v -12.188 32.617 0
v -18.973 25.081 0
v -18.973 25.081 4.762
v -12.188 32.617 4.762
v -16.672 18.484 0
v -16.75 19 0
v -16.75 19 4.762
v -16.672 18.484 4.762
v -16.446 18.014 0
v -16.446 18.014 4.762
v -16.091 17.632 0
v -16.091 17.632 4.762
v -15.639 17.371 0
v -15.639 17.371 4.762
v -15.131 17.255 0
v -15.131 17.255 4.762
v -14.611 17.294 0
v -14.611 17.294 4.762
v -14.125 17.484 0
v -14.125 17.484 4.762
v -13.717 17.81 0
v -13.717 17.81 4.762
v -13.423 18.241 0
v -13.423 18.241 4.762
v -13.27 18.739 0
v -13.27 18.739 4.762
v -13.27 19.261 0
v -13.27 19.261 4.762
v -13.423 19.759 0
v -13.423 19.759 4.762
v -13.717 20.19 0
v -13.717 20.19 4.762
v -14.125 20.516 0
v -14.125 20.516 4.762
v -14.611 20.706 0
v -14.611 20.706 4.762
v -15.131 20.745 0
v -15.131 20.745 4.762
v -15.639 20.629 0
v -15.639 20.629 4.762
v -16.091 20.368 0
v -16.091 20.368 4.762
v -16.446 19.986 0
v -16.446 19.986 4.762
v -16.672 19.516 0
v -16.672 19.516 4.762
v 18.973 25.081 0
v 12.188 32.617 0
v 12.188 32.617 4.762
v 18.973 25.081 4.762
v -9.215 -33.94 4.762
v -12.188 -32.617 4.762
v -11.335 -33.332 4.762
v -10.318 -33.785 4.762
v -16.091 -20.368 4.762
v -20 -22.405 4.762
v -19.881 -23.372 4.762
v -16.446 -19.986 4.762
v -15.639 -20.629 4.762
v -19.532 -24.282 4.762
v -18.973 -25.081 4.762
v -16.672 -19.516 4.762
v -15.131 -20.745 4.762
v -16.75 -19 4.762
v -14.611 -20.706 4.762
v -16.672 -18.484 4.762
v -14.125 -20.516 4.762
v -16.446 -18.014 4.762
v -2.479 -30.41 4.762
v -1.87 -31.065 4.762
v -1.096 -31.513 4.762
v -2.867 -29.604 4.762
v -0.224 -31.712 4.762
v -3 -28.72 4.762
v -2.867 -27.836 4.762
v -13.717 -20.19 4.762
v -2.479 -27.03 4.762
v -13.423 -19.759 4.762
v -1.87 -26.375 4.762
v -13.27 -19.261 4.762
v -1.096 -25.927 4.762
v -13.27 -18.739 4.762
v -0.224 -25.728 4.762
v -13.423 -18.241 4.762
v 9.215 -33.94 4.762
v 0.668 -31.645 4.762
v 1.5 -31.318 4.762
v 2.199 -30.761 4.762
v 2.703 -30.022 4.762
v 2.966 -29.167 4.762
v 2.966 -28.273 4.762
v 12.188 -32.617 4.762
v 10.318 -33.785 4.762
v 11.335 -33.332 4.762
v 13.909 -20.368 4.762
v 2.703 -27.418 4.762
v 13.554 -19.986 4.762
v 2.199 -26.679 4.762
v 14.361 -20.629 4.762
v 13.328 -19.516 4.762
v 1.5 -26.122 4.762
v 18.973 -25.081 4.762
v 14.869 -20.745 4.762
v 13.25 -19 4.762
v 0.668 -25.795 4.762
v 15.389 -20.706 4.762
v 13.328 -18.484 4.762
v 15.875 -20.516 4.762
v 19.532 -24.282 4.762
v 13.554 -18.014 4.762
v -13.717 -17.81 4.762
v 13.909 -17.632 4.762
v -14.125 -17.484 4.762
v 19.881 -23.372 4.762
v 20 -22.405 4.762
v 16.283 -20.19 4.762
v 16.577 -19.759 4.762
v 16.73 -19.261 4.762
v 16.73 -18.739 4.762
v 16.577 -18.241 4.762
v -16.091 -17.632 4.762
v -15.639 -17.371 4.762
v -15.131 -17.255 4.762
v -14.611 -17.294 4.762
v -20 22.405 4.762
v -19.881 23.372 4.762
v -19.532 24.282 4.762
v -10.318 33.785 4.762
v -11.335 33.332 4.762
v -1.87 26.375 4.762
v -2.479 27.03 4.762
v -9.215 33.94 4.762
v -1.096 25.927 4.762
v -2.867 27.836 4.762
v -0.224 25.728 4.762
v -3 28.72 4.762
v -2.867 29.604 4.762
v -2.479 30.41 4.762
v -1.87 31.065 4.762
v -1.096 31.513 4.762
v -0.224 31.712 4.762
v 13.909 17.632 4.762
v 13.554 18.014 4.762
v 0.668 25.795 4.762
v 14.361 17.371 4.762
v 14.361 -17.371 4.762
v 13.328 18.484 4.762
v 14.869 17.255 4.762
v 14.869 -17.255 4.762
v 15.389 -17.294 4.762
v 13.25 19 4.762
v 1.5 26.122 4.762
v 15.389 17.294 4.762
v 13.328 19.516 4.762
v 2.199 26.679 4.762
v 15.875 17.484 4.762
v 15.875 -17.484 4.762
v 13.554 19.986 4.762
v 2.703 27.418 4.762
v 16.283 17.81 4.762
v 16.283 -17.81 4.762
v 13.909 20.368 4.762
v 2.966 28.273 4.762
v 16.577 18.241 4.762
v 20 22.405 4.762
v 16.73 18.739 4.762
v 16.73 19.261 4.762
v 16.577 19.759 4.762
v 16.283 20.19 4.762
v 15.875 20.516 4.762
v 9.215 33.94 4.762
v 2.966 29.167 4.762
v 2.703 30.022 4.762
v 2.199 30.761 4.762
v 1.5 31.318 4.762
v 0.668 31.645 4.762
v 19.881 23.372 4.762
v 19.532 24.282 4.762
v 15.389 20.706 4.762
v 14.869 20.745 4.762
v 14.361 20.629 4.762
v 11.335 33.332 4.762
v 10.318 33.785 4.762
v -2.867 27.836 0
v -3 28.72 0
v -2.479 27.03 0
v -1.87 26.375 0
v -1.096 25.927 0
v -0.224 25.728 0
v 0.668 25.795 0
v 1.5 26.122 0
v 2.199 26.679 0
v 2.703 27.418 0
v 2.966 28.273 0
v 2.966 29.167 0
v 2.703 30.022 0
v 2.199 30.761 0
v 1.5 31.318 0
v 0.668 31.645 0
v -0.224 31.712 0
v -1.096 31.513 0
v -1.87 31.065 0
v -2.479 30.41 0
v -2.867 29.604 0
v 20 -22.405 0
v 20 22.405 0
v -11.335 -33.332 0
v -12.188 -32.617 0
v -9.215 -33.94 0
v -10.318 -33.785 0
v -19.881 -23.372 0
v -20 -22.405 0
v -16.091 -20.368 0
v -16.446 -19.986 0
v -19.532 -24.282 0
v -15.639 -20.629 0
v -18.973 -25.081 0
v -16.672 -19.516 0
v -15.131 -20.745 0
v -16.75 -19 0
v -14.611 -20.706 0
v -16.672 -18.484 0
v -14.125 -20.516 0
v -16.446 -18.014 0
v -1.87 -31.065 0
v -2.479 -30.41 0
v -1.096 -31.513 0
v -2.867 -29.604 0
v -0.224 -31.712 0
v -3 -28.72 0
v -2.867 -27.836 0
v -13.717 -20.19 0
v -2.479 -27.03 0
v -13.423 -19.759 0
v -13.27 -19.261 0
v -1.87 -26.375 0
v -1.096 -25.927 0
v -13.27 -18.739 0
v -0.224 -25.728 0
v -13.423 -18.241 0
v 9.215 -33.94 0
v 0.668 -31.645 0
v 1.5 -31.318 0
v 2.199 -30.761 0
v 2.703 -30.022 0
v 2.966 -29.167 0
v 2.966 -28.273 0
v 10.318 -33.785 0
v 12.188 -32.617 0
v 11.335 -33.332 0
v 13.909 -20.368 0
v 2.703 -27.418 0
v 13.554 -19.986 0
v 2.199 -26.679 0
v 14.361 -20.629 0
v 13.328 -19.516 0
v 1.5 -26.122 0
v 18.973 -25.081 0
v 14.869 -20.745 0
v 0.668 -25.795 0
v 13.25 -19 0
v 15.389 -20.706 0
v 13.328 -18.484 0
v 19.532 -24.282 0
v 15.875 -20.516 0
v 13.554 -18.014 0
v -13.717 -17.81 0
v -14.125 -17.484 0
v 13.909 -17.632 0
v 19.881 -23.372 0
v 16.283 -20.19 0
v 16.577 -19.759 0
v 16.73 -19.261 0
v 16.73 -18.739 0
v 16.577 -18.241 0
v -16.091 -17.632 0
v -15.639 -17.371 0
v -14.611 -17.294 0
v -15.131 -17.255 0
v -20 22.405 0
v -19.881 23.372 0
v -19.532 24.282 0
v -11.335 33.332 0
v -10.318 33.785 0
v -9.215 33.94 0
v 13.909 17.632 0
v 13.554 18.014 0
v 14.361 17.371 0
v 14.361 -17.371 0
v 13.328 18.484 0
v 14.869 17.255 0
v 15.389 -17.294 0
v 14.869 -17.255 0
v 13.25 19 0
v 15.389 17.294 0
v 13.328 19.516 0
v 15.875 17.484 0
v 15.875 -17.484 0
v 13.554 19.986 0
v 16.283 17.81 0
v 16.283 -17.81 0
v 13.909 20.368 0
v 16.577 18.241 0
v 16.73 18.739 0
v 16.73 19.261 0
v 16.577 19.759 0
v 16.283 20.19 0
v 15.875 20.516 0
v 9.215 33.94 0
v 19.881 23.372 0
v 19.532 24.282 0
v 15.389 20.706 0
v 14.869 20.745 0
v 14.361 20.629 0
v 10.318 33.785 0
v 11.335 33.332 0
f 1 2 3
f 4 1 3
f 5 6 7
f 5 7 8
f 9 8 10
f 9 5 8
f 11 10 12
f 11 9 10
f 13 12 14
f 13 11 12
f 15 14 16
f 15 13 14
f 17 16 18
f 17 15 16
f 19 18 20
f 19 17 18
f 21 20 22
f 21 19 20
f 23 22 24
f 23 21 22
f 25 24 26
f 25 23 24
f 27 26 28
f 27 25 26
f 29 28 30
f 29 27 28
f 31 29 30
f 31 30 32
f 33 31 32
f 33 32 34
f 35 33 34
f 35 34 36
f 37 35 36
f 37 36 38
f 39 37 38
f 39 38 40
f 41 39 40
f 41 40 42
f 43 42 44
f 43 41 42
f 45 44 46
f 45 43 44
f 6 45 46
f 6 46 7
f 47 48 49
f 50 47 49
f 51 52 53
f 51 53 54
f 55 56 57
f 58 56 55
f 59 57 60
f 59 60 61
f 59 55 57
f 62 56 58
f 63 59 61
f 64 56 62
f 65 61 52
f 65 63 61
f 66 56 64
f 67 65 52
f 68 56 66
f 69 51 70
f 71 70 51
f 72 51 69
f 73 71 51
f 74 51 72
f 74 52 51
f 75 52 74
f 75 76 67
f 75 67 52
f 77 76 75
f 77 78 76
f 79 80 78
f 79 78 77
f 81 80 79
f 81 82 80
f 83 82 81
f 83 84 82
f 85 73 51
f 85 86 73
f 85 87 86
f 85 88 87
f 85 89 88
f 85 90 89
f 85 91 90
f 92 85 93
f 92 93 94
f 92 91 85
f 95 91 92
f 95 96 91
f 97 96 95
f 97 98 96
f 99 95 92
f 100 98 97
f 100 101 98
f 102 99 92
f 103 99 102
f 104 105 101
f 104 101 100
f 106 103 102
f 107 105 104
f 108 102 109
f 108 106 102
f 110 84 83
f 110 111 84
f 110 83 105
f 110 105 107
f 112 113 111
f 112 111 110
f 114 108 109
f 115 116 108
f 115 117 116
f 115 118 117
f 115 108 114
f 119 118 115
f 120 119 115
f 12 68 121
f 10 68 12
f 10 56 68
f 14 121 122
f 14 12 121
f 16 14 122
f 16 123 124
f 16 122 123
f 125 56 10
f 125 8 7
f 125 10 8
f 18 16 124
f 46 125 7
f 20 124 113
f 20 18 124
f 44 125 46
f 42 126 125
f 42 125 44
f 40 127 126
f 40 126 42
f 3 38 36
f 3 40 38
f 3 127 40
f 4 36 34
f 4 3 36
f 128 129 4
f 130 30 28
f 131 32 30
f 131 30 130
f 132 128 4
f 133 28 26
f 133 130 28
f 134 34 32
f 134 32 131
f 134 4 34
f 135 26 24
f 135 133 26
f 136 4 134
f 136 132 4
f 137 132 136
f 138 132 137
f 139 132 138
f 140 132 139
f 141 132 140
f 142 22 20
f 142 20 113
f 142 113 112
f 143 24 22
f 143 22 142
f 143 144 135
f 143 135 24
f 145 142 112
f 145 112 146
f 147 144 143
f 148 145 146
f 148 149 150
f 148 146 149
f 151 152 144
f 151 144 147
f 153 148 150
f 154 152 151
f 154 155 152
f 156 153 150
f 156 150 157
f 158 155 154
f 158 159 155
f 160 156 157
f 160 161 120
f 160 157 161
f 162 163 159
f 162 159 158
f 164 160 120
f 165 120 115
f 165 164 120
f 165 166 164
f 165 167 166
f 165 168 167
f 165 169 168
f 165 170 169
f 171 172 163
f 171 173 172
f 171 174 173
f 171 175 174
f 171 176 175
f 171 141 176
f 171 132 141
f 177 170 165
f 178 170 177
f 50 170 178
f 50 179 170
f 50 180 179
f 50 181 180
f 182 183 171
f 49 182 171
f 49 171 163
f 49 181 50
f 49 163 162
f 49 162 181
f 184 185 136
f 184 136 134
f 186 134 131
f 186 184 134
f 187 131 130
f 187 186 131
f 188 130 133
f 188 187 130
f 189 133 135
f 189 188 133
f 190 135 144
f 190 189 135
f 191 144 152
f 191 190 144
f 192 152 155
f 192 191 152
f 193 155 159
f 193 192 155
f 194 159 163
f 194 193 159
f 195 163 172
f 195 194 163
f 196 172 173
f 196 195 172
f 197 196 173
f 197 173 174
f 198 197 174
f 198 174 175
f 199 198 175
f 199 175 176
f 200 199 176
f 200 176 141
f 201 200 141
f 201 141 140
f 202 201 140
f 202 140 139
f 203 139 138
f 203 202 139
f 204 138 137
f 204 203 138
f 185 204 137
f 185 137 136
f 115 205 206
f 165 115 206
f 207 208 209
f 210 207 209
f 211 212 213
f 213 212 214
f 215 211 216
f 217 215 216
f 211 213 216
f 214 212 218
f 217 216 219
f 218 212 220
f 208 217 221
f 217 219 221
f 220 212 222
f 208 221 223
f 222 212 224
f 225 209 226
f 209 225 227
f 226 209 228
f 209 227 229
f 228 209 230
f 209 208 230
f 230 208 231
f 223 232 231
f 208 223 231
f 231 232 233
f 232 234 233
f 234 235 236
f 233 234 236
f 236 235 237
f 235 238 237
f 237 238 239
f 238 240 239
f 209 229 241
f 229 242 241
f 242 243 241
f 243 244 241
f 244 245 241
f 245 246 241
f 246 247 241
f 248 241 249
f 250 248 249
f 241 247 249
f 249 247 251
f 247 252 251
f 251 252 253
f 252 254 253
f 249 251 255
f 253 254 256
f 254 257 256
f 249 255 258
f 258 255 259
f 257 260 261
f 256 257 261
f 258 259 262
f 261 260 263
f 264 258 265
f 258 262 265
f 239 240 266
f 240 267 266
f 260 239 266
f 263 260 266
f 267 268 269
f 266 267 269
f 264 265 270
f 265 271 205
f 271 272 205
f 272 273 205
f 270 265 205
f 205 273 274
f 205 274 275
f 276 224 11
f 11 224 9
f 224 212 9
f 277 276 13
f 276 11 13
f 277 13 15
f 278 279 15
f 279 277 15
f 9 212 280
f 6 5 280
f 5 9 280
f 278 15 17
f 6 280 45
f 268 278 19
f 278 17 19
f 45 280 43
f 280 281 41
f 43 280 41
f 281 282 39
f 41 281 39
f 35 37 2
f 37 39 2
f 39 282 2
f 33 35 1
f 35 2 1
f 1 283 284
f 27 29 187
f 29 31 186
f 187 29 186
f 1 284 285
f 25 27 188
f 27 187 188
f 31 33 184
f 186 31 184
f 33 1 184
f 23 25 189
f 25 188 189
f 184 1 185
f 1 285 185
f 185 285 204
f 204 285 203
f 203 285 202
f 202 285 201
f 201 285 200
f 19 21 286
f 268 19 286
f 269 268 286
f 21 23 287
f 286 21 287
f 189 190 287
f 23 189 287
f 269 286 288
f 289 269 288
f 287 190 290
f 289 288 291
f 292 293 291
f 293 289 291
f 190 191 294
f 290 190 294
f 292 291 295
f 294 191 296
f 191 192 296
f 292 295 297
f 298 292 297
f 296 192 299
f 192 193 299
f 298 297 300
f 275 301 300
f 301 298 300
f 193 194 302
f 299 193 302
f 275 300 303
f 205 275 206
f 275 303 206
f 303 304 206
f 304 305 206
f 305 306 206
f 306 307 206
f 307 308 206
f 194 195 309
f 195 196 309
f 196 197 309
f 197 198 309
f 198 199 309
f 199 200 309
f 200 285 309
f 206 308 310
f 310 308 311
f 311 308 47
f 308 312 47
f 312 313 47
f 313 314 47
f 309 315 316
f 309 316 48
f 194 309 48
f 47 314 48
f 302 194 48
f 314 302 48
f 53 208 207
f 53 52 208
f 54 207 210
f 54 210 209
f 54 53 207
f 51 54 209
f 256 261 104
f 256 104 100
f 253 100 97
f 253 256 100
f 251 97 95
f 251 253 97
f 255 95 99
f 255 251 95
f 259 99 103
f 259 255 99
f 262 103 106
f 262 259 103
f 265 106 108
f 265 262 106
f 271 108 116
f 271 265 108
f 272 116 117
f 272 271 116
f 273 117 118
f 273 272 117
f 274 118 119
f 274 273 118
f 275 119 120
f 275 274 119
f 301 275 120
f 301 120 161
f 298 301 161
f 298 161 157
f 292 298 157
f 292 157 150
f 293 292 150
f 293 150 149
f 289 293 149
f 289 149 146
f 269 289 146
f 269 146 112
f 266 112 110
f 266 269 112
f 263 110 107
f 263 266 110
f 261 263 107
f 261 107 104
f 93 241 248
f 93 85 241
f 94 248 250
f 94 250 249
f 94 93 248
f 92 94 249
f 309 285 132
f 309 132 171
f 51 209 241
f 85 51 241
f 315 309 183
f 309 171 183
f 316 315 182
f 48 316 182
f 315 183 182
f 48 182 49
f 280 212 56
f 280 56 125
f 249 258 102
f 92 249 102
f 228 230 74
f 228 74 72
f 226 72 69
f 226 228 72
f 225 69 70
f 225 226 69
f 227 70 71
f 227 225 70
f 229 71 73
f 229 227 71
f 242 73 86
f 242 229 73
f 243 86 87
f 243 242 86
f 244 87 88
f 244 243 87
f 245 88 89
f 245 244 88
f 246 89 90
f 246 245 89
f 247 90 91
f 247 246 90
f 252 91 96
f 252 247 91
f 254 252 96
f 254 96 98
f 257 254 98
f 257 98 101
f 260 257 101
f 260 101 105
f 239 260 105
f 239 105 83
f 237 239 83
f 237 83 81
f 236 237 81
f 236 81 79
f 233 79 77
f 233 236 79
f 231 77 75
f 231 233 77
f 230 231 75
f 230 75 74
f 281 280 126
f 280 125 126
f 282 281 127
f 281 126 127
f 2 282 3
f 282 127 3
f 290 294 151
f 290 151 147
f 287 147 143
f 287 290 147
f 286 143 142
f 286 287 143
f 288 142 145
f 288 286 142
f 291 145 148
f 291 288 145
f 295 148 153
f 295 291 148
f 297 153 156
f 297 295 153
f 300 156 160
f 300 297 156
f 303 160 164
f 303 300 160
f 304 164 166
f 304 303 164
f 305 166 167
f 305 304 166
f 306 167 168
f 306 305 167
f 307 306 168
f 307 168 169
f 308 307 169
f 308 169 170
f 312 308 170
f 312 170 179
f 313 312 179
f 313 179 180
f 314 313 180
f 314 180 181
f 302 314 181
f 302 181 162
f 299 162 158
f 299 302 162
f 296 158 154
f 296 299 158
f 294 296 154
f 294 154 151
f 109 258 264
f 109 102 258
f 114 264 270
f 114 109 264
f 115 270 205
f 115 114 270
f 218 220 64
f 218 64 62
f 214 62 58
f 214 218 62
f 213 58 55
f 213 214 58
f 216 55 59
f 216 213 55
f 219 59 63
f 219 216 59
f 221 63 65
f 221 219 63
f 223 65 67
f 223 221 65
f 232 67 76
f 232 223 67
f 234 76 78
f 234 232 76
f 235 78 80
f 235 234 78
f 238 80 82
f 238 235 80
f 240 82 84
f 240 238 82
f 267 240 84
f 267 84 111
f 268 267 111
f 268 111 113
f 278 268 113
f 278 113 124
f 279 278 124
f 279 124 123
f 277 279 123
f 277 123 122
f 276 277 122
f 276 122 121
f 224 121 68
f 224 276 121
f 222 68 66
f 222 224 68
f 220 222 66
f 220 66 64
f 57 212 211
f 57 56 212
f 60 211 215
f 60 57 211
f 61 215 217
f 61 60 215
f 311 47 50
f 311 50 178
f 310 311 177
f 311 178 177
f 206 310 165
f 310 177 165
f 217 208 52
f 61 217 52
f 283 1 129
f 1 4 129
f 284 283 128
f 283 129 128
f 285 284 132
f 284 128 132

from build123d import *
from OCP.BRepFilletAPI import BRepFilletAPI_MakeChamfer

# Parameters (mm, degrees)
SKETCH1_W           = 40
SKETCH1_H           = 67.88
SKETCH1_R           = 3
SKETCH1_R_2         = 1.75
BOSS_EXTRUDE1_DEPTH = 4.7625
CHAMFER1_SIZE       = 10
CHAMFER1_SIZE2      = 9.004040443
FILLET1_R           = 4


with BuildPart() as part:
    # Sketch1 → Boss-Extrude1 (new body)
    with BuildSketch(Plane.XY):
        Rectangle(SKETCH1_W, SKETCH1_H)
        with Locations(Location((4.07e-07, 28.72, 0), (0, 0, 180))):
            Circle(SKETCH1_R, mode=Mode.SUBTRACT)
        with Locations(Location((-4.07e-07, -28.72, 0), (0, 0, 180))):
            Circle(SKETCH1_R, mode=Mode.SUBTRACT)
        with Locations(Location((-14.999999995, 19, 0), (0, 0, 180))):
            Circle(SKETCH1_R_2, mode=Mode.SUBTRACT)
        with Locations(Location((-14.999999995, -19, 0), (0, 0, 180))):
            Circle(SKETCH1_R_2, mode=Mode.SUBTRACT)
        with Locations(Location((15.000000005, 19, 0), (0, 0, 180))):
            Circle(SKETCH1_R_2, mode=Mode.SUBTRACT)
        with Locations(Location((15.000000005, -19, 0), (0, 0, 180))):
            Circle(SKETCH1_R_2, mode=Mode.SUBTRACT)
    extrude(amount=BOSS_EXTRUDE1_DEPTH)

    # Chamfer1: one chamfer whose edges measure the first distance from different faces: ONE call of the kernel's chamfer builder (chamfer() names one face for all edges)
    chamfer1_edges_1 = [part.edges().sort_by_distance(p)[0] for p in [
        (20, -33.94, 2.38125),
        (20, 33.94, 2.38125),
    ]]
    chamfer1_side_1 = [part.faces().sort_by_distance(p)[0] for p in [
        (20, 0, 2.38125),
    ]]
    chamfer1_edges_2 = [part.edges().sort_by_distance(p)[0] for p in [
        (-20, -33.94, 2.38125),
        (-20, 33.94, 2.38125),
    ]]
    chamfer1_side_2 = [part.faces().sort_by_distance(p)[0] for p in [
        (-20, 0, 2.38125),
    ]]
    chamfer1 = BRepFilletAPI_MakeChamfer(part.part.solid().wrapped)
    for e in chamfer1_edges_1:
        chamfer1.Add(CHAMFER1_SIZE, CHAMFER1_SIZE2, e.wrapped, chamfer1_side_1[0].wrapped)  # the first distance lies on this face
    for e in chamfer1_edges_2:
        chamfer1.Add(CHAMFER1_SIZE, CHAMFER1_SIZE2, e.wrapped, chamfer1_side_2[0].wrapped)  # the first distance lies on this face
    add(Compound.cast(chamfer1.Shape()), mode=Mode.REPLACE)

    # Fillet1
    fillet1_edges = [part.edges().sort_by_distance(p)[0] for p in [
        (-20, -23.94, 2.38125),
        (-20, 23.94, 2.38125),
        (10.995959557, 33.94, 2.38125),
        (-10.995959557, 33.94, 2.38125),
        (10.995959557, -33.94, 2.38125),
        (-10.995959557, -33.94, 2.38125),
        (20, -23.94, 2.38125),
        (20, 23.94, 2.38125),
    ]]
    fillet(fillet1_edges, radius=FILLET1_R)


solid = part.part
